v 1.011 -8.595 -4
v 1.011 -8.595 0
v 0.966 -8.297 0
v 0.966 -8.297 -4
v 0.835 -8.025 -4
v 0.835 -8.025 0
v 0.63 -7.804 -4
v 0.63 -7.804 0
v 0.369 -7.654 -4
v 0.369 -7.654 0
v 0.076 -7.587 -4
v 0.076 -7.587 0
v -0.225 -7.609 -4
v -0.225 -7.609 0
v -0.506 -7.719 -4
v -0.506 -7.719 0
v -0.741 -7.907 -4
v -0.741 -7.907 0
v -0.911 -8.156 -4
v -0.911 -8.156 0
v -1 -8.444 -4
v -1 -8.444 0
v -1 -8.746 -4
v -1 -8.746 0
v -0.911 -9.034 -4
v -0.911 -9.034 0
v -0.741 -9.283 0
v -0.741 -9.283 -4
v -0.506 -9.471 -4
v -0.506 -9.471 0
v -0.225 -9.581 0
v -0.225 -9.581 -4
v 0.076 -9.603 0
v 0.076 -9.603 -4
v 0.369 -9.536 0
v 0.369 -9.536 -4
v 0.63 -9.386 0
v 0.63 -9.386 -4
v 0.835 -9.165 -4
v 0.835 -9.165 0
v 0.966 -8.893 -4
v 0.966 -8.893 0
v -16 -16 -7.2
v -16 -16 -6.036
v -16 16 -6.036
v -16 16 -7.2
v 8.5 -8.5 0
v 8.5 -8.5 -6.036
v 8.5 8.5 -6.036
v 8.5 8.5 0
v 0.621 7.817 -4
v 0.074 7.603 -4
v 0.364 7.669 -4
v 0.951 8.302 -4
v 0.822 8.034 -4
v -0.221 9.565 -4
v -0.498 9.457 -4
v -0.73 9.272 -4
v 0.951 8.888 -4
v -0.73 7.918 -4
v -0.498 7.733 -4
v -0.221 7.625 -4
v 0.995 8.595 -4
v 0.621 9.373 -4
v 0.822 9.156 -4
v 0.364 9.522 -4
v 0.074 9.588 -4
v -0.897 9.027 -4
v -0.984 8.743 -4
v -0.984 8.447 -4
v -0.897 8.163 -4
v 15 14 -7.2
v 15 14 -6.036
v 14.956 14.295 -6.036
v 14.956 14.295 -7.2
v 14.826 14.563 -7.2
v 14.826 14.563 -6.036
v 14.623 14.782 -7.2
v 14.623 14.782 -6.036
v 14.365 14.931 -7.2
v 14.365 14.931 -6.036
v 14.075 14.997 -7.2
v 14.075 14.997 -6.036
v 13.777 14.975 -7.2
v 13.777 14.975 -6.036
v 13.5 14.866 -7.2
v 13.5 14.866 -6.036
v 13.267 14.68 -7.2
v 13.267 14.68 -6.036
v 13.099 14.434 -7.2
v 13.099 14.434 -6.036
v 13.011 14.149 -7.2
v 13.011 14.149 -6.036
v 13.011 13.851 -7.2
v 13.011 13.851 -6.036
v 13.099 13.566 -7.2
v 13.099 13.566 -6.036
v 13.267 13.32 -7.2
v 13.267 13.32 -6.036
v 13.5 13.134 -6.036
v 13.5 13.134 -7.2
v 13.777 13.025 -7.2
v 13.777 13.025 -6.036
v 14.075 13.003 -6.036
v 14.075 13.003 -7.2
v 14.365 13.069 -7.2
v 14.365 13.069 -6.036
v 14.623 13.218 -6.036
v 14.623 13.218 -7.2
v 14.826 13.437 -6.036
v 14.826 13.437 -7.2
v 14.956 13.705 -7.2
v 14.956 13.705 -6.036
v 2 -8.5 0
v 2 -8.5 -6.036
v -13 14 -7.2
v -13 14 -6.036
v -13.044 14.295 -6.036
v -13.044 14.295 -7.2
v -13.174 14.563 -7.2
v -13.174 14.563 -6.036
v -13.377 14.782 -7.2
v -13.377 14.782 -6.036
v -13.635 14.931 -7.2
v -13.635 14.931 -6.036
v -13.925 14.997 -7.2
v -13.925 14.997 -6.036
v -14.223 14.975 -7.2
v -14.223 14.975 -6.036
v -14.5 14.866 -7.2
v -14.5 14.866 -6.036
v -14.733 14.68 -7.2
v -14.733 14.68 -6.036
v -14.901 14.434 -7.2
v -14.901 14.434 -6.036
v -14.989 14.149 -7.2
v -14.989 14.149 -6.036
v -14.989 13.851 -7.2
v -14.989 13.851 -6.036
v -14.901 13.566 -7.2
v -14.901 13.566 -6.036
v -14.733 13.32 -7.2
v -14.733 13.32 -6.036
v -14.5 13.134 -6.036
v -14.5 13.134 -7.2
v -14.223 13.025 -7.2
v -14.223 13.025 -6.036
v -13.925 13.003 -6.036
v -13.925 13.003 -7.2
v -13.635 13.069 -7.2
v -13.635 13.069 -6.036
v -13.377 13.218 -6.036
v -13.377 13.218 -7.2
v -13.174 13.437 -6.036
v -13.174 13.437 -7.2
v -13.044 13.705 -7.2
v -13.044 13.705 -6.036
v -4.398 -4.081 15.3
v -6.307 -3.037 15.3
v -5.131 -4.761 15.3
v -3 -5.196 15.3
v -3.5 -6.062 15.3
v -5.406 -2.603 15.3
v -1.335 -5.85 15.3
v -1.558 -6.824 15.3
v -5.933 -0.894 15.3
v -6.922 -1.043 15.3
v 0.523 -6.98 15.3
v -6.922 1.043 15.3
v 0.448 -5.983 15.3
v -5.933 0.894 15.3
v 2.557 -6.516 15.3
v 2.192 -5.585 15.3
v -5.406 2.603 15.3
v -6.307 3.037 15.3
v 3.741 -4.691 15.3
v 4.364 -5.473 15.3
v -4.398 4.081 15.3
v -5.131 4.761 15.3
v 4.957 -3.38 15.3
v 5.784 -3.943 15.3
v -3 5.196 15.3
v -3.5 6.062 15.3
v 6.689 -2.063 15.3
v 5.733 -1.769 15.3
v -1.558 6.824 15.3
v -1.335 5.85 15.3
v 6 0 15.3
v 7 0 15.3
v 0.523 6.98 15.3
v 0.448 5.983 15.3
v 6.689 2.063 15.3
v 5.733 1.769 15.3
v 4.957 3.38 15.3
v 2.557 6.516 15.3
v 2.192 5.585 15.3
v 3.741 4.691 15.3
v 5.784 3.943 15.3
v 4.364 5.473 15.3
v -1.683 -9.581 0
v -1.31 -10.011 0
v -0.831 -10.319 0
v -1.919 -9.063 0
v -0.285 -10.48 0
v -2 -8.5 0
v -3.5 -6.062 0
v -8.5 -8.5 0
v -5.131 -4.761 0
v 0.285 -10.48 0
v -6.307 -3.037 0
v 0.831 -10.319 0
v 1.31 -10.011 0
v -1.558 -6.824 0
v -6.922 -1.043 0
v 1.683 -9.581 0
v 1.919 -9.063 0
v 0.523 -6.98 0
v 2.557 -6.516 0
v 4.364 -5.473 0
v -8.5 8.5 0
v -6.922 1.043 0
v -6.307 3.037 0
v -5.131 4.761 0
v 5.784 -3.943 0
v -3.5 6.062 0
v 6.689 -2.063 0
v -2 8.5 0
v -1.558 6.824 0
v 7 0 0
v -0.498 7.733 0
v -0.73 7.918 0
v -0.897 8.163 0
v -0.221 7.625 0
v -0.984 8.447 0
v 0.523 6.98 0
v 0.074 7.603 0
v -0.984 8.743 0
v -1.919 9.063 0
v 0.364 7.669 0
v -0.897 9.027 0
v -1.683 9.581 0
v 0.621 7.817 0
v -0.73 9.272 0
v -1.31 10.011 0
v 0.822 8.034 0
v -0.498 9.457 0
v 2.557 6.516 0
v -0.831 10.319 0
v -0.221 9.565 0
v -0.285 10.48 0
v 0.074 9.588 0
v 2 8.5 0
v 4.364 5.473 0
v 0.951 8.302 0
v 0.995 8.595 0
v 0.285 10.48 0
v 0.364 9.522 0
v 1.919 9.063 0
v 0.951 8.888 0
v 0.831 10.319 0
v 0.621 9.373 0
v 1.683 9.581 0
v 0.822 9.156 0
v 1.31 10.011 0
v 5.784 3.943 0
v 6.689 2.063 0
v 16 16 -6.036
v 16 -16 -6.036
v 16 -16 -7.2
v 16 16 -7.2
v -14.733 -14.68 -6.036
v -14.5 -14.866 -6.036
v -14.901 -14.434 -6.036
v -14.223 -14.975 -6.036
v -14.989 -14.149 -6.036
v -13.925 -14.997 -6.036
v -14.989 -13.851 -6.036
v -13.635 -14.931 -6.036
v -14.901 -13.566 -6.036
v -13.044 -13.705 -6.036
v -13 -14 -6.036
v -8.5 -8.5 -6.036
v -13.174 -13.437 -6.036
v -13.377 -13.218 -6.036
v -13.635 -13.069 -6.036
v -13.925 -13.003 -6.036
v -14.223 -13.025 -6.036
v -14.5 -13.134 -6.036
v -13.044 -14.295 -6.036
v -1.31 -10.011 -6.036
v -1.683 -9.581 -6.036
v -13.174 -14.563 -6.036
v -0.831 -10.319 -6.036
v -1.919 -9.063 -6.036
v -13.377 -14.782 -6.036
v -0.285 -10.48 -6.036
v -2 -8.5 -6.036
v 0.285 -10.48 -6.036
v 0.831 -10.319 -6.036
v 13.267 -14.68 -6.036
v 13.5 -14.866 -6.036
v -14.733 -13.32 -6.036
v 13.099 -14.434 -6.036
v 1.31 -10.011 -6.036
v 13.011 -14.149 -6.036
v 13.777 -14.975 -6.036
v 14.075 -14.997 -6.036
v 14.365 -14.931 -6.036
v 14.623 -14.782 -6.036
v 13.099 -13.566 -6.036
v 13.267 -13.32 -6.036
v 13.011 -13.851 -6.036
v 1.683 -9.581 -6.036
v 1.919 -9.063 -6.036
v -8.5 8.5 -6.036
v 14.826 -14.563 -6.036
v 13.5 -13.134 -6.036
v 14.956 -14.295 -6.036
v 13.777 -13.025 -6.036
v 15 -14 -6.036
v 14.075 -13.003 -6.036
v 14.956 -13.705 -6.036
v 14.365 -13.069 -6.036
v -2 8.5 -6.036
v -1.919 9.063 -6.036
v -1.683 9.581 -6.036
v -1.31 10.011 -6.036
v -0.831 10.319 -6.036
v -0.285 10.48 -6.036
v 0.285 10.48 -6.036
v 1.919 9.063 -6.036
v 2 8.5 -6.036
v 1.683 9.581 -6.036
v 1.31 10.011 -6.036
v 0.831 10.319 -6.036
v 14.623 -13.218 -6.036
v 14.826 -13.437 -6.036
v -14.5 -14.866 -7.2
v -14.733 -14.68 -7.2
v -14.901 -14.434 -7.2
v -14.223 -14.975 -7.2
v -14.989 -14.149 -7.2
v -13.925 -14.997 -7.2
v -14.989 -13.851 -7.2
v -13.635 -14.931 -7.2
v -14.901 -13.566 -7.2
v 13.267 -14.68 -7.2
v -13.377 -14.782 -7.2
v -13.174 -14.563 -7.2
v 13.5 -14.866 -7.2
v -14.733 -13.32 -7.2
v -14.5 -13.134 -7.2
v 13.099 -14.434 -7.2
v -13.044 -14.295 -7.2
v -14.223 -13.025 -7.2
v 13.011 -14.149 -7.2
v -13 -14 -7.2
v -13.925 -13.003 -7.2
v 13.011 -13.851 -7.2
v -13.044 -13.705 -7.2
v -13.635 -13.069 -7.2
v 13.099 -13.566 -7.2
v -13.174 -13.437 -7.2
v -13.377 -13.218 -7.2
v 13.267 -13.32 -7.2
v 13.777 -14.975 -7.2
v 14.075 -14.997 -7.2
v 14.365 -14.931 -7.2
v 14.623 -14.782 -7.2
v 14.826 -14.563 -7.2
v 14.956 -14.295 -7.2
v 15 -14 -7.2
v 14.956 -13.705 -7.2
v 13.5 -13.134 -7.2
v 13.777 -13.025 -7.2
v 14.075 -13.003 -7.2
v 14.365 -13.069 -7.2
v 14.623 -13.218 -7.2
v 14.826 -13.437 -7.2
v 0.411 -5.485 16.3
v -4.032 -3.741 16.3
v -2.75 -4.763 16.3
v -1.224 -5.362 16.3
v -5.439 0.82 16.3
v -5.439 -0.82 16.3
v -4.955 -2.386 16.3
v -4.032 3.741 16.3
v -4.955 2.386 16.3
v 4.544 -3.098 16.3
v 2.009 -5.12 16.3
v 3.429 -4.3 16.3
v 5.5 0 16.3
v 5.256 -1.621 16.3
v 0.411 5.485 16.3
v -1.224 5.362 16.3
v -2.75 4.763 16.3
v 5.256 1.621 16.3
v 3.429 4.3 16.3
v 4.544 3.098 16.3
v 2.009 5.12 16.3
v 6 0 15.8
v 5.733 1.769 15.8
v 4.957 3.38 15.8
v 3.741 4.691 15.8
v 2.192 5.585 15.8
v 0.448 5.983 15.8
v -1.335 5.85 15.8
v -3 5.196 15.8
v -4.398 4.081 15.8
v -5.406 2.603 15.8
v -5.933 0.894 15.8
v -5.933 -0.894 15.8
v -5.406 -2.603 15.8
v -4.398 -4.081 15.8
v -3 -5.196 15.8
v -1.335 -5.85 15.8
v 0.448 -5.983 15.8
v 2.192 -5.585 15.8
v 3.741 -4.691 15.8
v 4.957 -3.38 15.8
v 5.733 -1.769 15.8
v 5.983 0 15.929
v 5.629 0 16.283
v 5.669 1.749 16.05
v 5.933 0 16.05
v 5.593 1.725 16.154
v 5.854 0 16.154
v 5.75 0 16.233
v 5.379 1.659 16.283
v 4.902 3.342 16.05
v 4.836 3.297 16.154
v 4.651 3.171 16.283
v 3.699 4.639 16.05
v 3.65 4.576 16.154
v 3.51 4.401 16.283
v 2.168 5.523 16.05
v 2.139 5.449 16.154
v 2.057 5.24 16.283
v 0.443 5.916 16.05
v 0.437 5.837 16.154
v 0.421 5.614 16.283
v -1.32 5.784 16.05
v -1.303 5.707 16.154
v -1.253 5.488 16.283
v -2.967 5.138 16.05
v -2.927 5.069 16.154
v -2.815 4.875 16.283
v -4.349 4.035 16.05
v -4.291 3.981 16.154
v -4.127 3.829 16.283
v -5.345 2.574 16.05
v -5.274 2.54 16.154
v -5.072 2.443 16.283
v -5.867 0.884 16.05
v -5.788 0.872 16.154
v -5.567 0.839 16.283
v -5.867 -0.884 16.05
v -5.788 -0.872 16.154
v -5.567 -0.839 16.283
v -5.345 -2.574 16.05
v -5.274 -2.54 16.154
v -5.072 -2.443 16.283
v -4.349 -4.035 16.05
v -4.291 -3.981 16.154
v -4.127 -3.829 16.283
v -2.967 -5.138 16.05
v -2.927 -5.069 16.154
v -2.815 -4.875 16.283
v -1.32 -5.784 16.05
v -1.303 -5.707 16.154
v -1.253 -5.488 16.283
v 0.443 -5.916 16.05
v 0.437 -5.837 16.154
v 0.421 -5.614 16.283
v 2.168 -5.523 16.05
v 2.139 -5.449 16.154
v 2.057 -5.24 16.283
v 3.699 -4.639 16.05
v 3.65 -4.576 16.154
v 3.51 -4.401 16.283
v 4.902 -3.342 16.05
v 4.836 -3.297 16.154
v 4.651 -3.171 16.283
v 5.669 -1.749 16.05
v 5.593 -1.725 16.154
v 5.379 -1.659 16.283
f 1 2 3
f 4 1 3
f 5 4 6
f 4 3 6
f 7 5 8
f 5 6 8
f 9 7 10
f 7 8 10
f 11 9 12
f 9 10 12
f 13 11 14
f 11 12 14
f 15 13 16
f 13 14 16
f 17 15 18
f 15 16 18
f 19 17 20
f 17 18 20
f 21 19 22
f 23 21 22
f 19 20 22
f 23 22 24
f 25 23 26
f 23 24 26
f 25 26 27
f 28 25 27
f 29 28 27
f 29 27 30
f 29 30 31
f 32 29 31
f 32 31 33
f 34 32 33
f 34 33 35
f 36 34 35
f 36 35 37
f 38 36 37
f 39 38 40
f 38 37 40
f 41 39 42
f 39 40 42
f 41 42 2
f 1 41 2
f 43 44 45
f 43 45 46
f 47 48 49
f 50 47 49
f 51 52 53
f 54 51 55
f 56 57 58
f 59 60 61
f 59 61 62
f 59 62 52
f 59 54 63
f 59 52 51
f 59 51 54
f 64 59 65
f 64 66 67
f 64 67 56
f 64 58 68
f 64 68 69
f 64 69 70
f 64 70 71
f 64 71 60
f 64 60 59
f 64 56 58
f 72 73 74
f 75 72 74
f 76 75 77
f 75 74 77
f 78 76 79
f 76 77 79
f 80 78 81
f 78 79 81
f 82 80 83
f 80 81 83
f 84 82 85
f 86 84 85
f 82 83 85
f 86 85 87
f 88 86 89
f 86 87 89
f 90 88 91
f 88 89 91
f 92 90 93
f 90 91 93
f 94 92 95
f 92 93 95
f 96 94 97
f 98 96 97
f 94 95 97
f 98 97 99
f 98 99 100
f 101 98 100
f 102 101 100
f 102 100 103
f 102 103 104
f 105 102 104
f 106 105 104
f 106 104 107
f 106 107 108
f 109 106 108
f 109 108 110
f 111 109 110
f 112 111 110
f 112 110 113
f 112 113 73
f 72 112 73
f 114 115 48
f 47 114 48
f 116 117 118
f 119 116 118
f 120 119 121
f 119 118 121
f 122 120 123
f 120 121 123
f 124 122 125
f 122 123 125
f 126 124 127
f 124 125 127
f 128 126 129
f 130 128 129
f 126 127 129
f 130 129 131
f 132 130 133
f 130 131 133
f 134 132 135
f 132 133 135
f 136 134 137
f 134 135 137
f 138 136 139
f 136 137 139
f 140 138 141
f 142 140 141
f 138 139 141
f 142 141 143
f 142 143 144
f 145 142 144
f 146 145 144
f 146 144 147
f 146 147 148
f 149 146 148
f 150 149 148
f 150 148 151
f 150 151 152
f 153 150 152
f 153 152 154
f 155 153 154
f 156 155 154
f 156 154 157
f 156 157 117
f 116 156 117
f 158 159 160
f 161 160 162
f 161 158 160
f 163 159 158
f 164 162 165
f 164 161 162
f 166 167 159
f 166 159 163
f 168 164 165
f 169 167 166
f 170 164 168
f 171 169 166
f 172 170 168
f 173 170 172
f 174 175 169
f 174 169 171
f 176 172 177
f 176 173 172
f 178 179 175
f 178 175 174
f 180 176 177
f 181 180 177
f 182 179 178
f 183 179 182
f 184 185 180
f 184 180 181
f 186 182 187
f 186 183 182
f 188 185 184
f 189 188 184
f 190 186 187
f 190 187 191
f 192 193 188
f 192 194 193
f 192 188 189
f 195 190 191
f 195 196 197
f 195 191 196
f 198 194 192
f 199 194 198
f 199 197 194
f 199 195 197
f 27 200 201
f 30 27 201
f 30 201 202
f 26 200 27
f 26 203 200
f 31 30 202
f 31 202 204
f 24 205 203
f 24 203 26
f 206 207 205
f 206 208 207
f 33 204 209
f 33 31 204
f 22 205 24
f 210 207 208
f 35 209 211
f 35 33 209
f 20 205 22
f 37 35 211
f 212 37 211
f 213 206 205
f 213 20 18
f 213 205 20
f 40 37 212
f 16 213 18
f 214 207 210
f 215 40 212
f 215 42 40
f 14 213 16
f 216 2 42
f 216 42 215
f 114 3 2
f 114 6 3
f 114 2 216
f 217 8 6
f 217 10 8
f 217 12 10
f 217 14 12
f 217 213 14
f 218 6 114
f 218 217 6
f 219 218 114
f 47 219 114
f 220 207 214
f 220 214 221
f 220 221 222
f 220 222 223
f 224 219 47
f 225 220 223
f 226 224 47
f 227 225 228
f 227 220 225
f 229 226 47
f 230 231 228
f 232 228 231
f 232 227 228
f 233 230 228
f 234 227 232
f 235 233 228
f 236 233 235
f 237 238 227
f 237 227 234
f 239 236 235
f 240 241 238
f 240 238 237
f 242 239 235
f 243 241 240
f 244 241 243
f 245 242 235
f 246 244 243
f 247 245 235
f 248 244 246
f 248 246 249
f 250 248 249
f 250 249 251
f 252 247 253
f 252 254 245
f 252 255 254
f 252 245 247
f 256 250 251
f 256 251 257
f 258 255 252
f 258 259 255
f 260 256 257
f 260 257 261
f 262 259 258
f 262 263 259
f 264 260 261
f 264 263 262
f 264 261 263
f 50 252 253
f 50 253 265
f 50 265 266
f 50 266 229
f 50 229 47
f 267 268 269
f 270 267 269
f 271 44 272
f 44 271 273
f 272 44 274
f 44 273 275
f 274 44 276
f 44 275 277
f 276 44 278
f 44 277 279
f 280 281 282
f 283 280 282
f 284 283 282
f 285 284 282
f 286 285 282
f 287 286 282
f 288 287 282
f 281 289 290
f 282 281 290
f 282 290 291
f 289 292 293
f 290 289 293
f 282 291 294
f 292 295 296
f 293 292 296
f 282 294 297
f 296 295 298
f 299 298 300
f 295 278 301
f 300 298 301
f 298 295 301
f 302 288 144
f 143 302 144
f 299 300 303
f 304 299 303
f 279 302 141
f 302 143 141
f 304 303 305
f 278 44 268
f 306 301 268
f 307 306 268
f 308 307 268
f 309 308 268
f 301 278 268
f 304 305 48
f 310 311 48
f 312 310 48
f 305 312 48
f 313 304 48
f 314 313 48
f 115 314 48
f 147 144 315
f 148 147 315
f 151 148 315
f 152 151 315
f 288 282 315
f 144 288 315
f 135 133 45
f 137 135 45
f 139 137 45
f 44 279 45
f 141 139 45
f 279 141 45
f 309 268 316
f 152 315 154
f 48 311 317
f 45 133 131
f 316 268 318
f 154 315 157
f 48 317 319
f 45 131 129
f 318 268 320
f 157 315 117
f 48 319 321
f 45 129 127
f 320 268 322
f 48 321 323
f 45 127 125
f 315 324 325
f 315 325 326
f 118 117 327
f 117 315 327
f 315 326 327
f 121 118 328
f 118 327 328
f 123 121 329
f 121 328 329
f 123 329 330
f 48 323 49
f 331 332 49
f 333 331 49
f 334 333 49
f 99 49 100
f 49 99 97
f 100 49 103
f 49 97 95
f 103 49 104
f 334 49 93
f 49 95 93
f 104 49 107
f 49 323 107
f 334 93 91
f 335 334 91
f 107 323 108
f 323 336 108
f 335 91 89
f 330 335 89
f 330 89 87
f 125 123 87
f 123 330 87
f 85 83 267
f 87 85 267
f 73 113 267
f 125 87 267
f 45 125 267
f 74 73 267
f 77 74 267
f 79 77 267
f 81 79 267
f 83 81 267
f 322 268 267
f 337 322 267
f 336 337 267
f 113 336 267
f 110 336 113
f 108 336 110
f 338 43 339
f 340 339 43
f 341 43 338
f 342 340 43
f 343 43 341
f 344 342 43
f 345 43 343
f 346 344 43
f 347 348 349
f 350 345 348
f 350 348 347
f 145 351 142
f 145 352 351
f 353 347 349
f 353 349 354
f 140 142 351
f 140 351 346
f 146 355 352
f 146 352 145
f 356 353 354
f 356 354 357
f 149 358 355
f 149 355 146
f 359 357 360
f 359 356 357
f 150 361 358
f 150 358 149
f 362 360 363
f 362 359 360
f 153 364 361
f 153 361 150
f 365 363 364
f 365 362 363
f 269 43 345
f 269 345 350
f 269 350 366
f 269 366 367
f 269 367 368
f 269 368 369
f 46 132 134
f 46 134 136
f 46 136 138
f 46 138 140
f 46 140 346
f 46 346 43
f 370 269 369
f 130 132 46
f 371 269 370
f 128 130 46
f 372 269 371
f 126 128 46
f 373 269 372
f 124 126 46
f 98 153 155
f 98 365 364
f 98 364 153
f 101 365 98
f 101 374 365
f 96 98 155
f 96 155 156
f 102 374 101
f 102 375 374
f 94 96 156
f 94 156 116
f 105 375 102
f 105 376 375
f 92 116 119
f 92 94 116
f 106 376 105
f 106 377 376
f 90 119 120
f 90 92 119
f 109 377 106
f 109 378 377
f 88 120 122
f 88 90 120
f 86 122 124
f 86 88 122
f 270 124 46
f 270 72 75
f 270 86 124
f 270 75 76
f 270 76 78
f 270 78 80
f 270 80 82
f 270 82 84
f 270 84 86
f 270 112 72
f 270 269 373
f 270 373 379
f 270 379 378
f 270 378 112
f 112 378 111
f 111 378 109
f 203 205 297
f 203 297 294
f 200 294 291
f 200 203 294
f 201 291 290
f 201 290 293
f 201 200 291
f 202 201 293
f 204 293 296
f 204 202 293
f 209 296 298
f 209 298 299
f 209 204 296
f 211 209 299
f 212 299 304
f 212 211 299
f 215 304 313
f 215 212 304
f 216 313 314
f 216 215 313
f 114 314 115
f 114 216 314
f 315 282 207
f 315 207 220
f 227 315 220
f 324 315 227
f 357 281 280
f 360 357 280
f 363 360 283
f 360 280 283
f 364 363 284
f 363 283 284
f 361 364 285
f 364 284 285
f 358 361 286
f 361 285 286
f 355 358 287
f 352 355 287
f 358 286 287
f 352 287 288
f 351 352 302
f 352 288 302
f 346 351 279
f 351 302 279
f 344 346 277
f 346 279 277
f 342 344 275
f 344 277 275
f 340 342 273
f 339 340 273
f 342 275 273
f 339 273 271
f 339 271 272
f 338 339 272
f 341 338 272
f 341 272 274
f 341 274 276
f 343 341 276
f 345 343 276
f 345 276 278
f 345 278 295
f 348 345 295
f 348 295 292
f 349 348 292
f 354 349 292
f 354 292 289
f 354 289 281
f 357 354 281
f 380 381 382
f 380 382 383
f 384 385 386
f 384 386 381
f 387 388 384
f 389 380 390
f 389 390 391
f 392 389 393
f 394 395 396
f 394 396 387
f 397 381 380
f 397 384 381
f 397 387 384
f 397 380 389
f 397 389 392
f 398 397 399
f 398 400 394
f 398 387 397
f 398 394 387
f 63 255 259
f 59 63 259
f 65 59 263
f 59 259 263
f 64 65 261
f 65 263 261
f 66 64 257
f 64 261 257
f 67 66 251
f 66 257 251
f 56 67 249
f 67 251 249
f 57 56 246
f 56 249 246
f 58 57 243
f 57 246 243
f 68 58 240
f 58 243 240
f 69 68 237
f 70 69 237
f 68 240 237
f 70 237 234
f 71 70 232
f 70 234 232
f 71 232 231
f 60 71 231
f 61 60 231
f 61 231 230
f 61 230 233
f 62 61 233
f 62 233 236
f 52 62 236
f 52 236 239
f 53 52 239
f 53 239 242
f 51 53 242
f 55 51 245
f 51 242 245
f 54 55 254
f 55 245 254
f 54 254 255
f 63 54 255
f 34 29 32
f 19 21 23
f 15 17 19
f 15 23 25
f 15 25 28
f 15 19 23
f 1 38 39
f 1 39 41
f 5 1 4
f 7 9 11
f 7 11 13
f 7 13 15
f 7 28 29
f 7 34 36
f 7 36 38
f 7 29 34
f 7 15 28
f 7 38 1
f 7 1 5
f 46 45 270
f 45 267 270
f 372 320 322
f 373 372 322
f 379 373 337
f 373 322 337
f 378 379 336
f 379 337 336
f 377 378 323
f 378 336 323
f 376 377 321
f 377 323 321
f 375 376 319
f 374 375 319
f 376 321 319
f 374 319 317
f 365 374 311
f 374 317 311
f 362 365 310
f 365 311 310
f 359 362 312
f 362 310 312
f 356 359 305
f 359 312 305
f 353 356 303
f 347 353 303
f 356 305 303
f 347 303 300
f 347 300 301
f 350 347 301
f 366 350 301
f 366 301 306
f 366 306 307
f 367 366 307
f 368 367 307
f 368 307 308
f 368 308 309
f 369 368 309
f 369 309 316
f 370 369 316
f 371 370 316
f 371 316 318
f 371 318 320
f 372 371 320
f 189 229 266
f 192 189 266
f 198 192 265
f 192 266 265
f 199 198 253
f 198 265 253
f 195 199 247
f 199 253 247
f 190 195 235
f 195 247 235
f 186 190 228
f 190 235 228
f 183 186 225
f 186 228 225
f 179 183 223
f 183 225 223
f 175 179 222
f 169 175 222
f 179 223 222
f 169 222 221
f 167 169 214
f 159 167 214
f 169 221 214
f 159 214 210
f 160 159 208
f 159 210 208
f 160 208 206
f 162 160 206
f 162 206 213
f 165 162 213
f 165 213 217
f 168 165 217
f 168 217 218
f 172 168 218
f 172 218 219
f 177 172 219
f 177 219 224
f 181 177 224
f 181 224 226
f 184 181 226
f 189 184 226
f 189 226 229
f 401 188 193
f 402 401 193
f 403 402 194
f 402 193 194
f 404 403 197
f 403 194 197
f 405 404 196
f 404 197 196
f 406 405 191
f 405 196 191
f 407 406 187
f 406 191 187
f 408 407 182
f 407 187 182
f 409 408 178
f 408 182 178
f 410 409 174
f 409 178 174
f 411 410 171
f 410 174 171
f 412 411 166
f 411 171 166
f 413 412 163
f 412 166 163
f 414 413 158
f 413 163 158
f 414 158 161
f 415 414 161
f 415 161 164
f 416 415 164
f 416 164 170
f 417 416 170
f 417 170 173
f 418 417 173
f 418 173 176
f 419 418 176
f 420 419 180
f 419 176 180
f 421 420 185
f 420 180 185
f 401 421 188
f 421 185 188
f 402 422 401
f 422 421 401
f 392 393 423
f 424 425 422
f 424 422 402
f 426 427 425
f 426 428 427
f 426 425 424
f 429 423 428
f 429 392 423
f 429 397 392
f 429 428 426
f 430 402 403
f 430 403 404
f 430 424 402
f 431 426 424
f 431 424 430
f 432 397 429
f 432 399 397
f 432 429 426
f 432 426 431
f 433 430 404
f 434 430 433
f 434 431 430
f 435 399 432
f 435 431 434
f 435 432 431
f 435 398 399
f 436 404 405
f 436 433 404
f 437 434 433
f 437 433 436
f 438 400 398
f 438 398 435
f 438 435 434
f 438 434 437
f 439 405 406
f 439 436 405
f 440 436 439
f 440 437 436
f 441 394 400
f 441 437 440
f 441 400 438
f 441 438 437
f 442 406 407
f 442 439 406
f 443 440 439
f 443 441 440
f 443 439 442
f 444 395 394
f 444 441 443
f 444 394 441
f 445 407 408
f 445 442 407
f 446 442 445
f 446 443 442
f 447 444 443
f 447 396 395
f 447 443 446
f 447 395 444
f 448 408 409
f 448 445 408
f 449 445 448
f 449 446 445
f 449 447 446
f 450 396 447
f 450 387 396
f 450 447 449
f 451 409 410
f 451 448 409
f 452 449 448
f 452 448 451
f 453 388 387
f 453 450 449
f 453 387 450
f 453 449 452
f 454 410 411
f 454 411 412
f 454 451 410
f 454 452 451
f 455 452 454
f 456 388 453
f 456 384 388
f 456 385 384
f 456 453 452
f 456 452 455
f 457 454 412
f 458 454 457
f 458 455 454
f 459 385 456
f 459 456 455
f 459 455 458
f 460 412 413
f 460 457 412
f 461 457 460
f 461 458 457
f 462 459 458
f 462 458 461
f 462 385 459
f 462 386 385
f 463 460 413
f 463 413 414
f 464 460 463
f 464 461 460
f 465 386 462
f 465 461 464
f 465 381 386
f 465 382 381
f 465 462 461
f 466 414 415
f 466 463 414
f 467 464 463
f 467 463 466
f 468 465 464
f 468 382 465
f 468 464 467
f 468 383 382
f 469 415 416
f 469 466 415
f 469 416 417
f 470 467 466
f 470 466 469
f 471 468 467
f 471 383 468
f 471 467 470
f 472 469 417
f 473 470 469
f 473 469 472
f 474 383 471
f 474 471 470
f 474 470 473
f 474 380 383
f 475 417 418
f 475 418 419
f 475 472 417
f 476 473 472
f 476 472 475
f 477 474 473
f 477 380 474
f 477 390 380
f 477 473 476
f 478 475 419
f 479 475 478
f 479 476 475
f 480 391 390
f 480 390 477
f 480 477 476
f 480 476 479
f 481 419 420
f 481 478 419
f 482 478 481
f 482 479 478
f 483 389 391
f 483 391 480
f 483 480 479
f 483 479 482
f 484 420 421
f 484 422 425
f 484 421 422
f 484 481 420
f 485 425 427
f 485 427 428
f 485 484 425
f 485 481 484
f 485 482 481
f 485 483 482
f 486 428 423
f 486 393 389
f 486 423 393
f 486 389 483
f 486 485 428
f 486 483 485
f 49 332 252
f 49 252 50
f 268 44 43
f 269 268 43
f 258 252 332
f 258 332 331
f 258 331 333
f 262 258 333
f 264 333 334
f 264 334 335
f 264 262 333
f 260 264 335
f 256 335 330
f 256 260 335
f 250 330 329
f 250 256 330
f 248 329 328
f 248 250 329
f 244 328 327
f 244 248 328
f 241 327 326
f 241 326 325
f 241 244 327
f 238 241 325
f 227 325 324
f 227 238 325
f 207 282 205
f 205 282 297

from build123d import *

# Parameters (mm, degrees)
SKETCH1_R           = 7
BOSS_EXTRUDE1_DEPTH = 15.3
SKETCH2_R           = 6
BOSS_EXTRUDE2_DEPTH = 1
FILLET1_R           = 0.5
SKETCH3_W           = 1.163915396
SKETCH3_H           = 32
BOSS_EXTRUDE3_DEPTH = 16
SKETCH4_W           = 17
SKETCH4_H           = 17
BOSS_EXTRUDE4_DEPTH = 6.036084604
SKETCH5_R           = 1
CUT_EXTRUDE1_DEPTH  = 4
SKETCH6_R           = 2
BOSS_EXTRUDE5_DEPTH = 6.036084604
SKETCH7_R           = 0.995331294
SKETCH7_R_2         = 1.011185122
CUT_EXTRUDE2_DEPTH  = 4


with BuildPart() as part:
    # Sketch1 → Boss-Extrude1 (new body)
    with BuildSketch(Plane.XY):
        Circle(SKETCH1_R)
    extrude(amount=BOSS_EXTRUDE1_DEPTH)

    # Sketch2 → Boss-Extrude2 (add)
    with BuildSketch(Plane.XY.offset(15.3)):
        Circle(SKETCH2_R)
    extrude(amount=BOSS_EXTRUDE2_DEPTH)

    # Fillet1
    fillet1_edges = [part.edges().sort_by_distance(p)[0] for p in [
        (-6, 0, 16.3),
    ]]
    fillet(fillet1_edges, radius=FILLET1_R)



with BuildPart() as body_2:
    # Sketch3 → Boss-Extrude3 (new, symmetric)
    with BuildSketch(Plane(origin=(0, 0, 0), x_dir=(0, 0, -1), z_dir=(1, 0, 0))):
        with Locations((6.618042302, 0)):
            Rectangle(SKETCH3_W, SKETCH3_H)
    extrude(amount=BOSS_EXTRUDE3_DEPTH, both=True)


with BuildPart() as part_1:
    add(part.part)

    add(body_2.part)  # Boss-Extrude4 merges body 2
    # Sketch4 → Boss-Extrude4 (add)
    with BuildSketch(Plane.XY.offset(-6.036084604)):
        Rectangle(SKETCH4_W, SKETCH4_H)
    extrude(amount=BOSS_EXTRUDE4_DEPTH)

    # Sketch5 → Cut-Extrude1 (cut)
    with BuildSketch(Plane.XY.offset(-6.036084604)):
        with Locations((-14, 14)):
            Circle(SKETCH5_R)
        with Locations((14, 14)):
            Circle(SKETCH5_R)
        with Locations((14, -14)):
            Circle(SKETCH5_R)
        with Locations((-14, -14)):
            Circle(SKETCH5_R)
    extrude(amount=-CUT_EXTRUDE1_DEPTH, mode=Mode.SUBTRACT)

    # Sketch6 → Boss-Extrude5 (add)
    with BuildSketch(Plane.XY):
        with Locations((0, 8.5)):
            Circle(SKETCH6_R)
        with Locations((0, -8.5)):
            Circle(SKETCH6_R)
    extrude(amount=-BOSS_EXTRUDE5_DEPTH)

    # Sketch7 → Cut-Extrude2 (cut)
    with BuildSketch(Plane.XY):
        with Locations((0, 8.595073535)):
            Circle(SKETCH7_R)
        with Locations((0, -8.595073535)):
            Circle(SKETCH7_R_2)
    extrude(amount=-CUT_EXTRUDE2_DEPTH, mode=Mode.SUBTRACT)


solid = part_1.part
